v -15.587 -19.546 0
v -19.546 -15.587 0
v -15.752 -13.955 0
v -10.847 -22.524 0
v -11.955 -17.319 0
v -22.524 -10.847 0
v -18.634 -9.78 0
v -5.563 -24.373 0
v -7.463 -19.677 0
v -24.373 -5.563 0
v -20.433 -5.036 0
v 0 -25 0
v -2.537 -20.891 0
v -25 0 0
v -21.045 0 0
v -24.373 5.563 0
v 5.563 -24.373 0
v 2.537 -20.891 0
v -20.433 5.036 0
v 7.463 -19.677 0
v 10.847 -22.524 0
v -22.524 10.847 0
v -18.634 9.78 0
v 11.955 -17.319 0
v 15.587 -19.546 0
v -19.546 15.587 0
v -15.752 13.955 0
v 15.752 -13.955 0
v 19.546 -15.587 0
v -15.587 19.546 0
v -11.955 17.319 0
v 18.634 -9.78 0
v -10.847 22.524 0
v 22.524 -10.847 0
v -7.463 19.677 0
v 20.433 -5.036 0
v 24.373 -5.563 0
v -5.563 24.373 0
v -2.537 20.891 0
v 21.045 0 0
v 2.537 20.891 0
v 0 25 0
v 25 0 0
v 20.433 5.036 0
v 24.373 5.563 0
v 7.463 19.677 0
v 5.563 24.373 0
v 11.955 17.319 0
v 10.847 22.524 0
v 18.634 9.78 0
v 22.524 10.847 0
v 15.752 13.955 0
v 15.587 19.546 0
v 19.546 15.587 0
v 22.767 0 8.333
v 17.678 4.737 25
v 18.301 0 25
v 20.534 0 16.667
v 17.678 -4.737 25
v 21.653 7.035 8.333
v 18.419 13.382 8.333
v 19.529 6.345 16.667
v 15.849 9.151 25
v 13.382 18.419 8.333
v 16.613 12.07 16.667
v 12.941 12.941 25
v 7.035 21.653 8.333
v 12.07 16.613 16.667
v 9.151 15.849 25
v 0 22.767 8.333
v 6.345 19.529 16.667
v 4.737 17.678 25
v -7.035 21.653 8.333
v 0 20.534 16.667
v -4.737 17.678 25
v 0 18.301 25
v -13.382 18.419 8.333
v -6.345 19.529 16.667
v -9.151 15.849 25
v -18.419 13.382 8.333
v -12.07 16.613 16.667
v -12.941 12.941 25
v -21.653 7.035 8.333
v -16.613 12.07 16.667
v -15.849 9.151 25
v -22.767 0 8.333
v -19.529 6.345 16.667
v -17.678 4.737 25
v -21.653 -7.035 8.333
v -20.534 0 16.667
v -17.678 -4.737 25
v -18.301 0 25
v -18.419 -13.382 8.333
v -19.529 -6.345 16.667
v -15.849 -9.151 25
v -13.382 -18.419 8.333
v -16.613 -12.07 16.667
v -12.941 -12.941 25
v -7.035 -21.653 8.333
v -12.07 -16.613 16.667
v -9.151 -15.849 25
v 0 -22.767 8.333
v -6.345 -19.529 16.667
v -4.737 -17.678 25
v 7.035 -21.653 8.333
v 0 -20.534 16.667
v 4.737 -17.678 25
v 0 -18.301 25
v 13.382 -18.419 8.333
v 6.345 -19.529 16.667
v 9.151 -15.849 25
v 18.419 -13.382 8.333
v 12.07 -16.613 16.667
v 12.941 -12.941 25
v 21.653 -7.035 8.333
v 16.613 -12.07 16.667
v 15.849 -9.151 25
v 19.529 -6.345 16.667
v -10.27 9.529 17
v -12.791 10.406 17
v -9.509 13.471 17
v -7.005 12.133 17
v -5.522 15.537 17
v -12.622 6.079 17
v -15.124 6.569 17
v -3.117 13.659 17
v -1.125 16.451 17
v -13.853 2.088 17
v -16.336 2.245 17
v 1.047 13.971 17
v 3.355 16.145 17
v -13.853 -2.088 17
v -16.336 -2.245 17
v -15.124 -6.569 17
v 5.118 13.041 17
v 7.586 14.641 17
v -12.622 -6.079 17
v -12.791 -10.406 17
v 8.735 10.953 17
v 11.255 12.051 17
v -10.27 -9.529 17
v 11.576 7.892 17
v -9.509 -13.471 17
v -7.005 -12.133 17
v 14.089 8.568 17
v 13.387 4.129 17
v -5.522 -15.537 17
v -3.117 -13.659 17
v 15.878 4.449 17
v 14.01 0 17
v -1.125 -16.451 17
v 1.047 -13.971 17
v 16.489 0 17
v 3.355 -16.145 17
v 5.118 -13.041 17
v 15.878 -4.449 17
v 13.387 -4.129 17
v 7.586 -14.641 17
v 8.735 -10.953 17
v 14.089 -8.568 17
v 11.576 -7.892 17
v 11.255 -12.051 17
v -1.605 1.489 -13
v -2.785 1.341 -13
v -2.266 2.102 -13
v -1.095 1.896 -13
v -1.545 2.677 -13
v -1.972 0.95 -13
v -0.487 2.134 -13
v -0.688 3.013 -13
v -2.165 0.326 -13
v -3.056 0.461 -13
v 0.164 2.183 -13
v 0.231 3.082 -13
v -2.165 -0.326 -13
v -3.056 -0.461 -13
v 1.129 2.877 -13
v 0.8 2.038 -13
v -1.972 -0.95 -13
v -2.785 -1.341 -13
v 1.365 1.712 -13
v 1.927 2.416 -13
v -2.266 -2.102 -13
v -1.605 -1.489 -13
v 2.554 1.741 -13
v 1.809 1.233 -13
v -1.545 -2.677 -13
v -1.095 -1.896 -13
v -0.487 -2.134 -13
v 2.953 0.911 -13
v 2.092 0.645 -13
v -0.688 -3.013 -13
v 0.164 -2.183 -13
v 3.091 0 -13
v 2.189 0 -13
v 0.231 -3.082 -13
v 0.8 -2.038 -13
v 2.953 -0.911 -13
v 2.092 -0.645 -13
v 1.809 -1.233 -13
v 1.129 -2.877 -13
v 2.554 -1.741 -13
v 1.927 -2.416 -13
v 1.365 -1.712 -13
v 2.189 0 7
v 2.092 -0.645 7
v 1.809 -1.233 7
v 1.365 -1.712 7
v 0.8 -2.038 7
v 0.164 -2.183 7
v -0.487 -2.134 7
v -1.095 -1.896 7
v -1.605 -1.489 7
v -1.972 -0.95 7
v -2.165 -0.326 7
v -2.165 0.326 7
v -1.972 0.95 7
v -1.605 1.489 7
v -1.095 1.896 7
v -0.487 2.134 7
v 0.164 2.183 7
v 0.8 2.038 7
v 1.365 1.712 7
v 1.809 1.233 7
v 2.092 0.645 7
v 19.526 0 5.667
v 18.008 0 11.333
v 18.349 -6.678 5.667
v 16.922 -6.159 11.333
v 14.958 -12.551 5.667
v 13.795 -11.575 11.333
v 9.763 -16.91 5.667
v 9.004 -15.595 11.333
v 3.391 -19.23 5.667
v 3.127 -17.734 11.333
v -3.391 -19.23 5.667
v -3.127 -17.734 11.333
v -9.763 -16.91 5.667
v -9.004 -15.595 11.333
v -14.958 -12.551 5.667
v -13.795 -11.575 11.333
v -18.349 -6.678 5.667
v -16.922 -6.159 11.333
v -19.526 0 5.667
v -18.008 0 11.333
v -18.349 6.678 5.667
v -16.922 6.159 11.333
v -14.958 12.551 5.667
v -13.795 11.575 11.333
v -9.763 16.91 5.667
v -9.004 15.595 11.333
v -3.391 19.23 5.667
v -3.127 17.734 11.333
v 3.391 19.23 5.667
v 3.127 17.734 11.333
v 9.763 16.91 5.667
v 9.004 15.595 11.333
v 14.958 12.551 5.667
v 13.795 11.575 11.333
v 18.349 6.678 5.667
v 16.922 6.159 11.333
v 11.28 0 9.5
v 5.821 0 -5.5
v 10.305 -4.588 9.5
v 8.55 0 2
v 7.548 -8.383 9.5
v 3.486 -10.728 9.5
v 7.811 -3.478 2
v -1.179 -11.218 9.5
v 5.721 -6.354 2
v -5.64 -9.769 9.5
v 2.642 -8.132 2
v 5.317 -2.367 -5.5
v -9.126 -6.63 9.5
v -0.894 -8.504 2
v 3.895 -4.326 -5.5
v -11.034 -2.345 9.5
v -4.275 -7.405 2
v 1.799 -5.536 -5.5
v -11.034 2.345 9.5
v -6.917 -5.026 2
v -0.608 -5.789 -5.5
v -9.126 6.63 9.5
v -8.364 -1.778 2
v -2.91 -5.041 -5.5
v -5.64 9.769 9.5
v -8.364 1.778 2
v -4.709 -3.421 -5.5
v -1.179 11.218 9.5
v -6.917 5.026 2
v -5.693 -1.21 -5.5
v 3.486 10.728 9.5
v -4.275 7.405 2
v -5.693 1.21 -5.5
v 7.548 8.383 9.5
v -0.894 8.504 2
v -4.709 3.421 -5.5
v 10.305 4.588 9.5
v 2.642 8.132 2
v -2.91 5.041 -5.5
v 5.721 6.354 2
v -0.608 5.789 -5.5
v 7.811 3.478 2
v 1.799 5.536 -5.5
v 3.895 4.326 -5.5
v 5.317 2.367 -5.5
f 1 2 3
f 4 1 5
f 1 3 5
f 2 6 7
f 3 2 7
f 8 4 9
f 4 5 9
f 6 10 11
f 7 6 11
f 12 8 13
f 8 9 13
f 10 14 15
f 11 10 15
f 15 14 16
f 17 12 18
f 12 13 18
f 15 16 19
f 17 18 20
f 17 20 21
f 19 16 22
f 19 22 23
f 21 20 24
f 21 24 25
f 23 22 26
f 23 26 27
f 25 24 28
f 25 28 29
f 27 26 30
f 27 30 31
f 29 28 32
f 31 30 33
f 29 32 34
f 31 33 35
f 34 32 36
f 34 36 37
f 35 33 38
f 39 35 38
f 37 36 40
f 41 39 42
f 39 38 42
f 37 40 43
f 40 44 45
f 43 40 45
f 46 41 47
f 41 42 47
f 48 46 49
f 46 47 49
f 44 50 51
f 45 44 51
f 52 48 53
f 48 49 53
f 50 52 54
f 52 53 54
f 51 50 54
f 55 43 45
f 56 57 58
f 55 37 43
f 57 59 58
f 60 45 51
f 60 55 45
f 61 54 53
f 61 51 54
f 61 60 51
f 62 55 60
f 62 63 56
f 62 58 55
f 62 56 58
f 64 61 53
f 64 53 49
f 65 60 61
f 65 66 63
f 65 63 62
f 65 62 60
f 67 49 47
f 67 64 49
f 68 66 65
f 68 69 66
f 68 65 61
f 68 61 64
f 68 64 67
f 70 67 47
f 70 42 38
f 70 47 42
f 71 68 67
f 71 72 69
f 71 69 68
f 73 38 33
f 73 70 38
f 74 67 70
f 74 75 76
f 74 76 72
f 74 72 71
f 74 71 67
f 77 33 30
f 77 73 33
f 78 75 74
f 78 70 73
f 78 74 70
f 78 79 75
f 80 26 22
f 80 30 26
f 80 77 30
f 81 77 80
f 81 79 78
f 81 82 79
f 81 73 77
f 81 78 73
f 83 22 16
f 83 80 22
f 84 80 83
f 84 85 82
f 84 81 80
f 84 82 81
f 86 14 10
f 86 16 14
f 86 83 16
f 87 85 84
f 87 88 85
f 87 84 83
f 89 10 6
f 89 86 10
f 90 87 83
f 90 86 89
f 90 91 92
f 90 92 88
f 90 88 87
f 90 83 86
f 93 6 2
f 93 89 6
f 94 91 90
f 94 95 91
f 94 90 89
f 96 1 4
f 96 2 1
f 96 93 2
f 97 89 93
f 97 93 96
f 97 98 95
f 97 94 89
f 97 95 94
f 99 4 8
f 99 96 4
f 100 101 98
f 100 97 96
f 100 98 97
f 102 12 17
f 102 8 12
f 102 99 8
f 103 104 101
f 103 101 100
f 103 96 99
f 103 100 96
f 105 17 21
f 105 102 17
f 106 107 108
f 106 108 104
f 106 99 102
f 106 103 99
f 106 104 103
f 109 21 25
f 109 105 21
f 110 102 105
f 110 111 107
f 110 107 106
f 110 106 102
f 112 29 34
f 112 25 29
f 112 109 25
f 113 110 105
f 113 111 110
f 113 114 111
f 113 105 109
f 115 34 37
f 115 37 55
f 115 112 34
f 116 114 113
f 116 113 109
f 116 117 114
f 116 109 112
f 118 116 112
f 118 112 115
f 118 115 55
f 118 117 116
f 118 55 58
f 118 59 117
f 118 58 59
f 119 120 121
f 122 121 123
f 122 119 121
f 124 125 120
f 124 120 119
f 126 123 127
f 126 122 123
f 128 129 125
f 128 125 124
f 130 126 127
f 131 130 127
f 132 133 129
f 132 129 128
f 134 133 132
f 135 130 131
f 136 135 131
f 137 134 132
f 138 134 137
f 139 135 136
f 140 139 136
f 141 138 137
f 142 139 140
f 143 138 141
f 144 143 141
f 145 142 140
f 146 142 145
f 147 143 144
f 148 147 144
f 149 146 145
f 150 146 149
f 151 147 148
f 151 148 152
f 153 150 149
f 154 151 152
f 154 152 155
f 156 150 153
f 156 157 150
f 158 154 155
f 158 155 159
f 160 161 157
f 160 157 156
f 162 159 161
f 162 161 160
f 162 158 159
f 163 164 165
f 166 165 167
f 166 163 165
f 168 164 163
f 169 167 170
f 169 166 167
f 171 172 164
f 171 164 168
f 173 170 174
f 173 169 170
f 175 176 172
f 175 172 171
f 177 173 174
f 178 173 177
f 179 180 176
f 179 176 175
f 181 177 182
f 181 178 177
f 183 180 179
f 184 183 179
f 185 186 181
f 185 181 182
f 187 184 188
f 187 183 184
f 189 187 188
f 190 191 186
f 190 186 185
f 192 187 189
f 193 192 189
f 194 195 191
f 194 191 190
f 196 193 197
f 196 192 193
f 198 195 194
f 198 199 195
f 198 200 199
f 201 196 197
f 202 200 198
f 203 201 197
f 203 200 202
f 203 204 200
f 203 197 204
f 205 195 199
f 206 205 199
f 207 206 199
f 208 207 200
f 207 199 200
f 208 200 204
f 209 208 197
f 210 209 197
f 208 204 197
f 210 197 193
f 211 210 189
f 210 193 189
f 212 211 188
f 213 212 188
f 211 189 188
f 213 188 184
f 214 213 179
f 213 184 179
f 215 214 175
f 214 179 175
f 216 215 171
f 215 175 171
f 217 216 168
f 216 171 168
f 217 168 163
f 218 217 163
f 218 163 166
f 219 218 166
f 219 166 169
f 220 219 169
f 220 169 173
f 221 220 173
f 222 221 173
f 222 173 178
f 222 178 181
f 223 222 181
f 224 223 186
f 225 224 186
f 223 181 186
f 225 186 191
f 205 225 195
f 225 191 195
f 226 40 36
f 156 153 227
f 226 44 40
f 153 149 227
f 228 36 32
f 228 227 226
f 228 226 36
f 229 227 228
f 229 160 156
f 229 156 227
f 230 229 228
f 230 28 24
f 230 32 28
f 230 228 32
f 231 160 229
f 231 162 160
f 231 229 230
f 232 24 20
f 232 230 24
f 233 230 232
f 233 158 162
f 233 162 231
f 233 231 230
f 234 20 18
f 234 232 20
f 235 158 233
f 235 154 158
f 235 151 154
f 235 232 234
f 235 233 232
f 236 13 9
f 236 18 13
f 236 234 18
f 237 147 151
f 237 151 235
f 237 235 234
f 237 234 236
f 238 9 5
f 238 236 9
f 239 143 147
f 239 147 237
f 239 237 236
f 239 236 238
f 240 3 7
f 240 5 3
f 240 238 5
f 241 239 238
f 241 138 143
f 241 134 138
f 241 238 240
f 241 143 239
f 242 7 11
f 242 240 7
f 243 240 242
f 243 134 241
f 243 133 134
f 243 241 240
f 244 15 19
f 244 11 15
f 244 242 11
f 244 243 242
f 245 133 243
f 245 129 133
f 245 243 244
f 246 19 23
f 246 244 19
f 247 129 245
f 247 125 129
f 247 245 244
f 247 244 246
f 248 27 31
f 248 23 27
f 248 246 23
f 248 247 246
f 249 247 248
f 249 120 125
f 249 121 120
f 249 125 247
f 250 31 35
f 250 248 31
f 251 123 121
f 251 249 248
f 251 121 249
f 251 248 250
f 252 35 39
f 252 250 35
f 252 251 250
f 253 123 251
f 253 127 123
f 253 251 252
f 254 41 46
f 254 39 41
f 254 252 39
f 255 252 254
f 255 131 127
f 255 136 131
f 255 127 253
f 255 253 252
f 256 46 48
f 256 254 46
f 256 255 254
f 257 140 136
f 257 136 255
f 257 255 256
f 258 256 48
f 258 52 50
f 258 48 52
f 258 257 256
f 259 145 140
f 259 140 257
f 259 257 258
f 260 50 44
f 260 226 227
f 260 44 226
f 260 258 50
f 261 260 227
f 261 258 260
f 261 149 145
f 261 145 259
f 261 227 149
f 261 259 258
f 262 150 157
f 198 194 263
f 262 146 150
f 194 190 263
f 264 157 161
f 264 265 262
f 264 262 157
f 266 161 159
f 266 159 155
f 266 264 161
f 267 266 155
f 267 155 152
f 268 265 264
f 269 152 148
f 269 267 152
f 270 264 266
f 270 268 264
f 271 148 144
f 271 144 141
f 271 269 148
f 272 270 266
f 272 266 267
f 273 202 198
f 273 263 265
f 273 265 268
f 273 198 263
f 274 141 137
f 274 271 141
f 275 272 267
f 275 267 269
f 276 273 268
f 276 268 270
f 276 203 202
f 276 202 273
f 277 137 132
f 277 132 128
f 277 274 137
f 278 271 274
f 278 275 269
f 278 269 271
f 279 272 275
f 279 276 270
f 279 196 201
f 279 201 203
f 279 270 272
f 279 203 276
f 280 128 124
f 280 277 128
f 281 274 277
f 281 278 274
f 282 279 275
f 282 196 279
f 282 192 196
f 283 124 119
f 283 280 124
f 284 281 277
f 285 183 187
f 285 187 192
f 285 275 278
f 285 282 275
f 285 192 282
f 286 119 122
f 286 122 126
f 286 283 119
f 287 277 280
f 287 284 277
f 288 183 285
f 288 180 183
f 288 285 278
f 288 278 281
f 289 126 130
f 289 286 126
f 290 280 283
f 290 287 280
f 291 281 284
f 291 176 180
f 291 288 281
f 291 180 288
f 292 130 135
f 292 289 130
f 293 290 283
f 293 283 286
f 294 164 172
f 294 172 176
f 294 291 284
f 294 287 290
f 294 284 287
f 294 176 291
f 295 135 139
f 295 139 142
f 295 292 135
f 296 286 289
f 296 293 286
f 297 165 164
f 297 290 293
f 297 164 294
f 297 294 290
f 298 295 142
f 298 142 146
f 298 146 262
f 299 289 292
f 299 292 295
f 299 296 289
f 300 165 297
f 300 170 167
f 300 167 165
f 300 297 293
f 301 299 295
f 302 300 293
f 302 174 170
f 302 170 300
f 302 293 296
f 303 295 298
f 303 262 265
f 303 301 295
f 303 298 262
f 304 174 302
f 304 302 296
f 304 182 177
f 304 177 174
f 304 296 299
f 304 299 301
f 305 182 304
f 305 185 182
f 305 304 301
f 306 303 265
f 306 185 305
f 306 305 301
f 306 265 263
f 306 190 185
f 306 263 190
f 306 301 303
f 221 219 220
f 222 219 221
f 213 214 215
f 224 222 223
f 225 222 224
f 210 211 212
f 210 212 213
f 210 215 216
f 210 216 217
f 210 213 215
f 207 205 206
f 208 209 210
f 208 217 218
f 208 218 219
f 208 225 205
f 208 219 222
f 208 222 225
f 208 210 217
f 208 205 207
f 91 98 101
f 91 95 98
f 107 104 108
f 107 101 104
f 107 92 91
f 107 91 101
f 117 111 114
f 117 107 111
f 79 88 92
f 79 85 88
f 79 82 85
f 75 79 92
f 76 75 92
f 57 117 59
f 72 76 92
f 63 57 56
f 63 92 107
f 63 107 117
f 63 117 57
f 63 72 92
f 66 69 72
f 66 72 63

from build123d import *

# Parameters (mm, degrees)
SKETCH_R        = 25
PAD_DEPTH       = 25
PAD_TAPER       = 15
SKETCH001_R     = 21.044581
POCKET_DEPTH    = 17
POCKET_TAPER    = 15
SKETCH002_R     = 14.009915
PAD001_DEPTH    = 30
PAD001_TAPER    = 20
SKETCH003_R     = 2.189118
POCKET001_DEPTH = 20


with BuildPart() as part:
    # Sketch → Pad (new body)
    with BuildSketch(Plane.XY):
        Circle(SKETCH_R)
    extrude(amount=PAD_DEPTH, taper=PAD_TAPER)

    # Sketch001 (on Face2 of Pad) → Pocket (cut)
    with BuildSketch(Plane(origin=(0, 0, 0), x_dir=(1, 0, 0), z_dir=(0, 0, -1))):
        Circle(SKETCH001_R)
    extrude(amount=-POCKET_DEPTH, taper=POCKET_TAPER, mode=Mode.SUBTRACT)

    # Sketch002 (on Face5 of Pocket) → Pad001 (join)
    with BuildSketch(Plane(origin=(0, 0, 17), x_dir=(1, 0, 0), z_dir=(0, 0, -1))):
        Circle(SKETCH002_R)
    extrude(amount=PAD001_DEPTH, taper=PAD001_TAPER)

    # Sketch003 (on Face7 of Pad001) → Pocket001 (cut)
    with BuildSketch(Plane(origin=(0, 0, -13), x_dir=(1, 0, 0), z_dir=(0, 0, -1))):
        Circle(SKETCH003_R)
    extrude(amount=-POCKET001_DEPTH, mode=Mode.SUBTRACT)


solid = part.part
